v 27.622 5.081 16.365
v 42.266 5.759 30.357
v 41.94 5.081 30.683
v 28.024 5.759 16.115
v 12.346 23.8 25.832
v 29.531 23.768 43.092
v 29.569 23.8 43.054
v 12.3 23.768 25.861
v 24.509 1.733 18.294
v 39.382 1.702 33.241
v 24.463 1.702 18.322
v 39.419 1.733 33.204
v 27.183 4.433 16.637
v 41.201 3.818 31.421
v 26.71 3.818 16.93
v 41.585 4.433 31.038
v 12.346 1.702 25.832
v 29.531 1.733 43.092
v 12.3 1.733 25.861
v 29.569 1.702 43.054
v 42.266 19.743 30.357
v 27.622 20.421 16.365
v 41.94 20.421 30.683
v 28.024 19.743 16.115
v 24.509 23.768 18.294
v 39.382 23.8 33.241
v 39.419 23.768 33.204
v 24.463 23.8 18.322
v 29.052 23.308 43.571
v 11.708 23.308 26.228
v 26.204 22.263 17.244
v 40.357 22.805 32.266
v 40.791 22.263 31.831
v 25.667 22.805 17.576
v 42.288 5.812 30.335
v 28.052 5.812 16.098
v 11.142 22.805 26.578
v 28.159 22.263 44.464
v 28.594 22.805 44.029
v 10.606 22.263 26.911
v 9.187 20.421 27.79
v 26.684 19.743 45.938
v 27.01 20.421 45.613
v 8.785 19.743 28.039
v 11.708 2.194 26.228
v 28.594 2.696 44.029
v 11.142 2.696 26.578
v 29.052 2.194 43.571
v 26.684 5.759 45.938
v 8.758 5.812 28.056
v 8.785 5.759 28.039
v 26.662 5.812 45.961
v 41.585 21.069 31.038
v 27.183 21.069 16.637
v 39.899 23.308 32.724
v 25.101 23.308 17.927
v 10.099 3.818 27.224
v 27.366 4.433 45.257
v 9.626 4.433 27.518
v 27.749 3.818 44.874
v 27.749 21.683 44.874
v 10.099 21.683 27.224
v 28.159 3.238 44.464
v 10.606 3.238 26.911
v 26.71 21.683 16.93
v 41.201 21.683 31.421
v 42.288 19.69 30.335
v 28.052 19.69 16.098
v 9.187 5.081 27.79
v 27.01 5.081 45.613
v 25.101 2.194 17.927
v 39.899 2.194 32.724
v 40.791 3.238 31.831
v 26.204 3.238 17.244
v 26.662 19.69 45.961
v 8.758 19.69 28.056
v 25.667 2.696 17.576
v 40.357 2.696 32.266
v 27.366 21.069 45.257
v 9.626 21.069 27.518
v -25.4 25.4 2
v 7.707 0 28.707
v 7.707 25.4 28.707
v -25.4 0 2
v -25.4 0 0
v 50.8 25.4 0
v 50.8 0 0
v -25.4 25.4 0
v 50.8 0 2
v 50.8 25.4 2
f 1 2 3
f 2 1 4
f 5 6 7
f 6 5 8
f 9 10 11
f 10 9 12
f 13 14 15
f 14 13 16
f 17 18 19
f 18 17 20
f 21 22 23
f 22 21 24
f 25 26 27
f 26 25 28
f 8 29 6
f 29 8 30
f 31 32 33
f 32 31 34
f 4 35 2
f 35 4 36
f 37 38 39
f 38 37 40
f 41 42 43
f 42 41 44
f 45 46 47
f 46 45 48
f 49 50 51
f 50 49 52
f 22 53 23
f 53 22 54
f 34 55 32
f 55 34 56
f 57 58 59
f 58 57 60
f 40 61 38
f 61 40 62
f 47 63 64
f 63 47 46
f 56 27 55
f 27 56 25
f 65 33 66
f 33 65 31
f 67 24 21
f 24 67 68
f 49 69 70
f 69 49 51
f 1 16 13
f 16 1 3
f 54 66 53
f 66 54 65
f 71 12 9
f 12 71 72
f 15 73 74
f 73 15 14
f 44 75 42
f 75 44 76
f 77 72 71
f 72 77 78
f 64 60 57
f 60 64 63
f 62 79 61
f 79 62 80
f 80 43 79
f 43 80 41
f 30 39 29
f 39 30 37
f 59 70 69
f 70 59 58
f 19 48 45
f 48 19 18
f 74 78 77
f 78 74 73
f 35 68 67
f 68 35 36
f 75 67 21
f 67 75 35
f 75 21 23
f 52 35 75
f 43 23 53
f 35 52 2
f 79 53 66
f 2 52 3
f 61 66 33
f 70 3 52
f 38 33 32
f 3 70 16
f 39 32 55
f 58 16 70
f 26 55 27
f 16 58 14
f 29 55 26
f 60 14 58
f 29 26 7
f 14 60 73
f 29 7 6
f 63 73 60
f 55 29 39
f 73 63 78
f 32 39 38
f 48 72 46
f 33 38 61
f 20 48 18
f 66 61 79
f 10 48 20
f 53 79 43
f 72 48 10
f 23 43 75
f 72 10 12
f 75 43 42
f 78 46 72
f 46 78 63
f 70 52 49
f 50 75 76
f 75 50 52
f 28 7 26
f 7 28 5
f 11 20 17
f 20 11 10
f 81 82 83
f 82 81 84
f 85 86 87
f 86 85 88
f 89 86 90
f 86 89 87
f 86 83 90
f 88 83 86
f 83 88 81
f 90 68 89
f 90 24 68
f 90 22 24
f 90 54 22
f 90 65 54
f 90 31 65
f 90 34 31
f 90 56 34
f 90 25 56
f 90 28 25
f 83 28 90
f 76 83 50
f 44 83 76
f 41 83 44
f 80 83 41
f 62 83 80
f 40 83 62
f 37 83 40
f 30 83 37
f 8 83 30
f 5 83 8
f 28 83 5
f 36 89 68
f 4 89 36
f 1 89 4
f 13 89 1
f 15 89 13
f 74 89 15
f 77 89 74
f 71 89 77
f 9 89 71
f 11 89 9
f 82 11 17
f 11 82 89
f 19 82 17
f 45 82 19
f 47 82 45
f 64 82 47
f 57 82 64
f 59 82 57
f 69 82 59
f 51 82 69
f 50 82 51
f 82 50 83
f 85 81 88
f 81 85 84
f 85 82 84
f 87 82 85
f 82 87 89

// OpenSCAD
inch = 25.4;
estowall = .067 * inch;
estosize = .87 * inch;

$fn=100;

module rounded_cube(thex,thez)
{
 difference(){
         cube([thex,thex,thez]);
         translate([thex/2,thex/2,0]) tube(estosize/2+6,4,1.5 * inch);    
 }
}

module tube(rx,tx,size)
{
    difference(){
      cylinder(r=rx,h=size);
      translate([0,0,-.5]) cylinder(r=rx-tx,h=size+1);
    }
}



    hull(){
	   translate([-1*inch,0,0]) cube([3*inch,1*inch,2]);
       cube([1*inch,1*inch,10]);
       translate([7,0,28]) rotate([0,45,0]) cube([1*inch,1*inch,1]);    
       }
       
    
 translate([estowall+7,estowall,28]) rotate([0,45,0])  rounded_cube(estosize,inch);
       
//t
